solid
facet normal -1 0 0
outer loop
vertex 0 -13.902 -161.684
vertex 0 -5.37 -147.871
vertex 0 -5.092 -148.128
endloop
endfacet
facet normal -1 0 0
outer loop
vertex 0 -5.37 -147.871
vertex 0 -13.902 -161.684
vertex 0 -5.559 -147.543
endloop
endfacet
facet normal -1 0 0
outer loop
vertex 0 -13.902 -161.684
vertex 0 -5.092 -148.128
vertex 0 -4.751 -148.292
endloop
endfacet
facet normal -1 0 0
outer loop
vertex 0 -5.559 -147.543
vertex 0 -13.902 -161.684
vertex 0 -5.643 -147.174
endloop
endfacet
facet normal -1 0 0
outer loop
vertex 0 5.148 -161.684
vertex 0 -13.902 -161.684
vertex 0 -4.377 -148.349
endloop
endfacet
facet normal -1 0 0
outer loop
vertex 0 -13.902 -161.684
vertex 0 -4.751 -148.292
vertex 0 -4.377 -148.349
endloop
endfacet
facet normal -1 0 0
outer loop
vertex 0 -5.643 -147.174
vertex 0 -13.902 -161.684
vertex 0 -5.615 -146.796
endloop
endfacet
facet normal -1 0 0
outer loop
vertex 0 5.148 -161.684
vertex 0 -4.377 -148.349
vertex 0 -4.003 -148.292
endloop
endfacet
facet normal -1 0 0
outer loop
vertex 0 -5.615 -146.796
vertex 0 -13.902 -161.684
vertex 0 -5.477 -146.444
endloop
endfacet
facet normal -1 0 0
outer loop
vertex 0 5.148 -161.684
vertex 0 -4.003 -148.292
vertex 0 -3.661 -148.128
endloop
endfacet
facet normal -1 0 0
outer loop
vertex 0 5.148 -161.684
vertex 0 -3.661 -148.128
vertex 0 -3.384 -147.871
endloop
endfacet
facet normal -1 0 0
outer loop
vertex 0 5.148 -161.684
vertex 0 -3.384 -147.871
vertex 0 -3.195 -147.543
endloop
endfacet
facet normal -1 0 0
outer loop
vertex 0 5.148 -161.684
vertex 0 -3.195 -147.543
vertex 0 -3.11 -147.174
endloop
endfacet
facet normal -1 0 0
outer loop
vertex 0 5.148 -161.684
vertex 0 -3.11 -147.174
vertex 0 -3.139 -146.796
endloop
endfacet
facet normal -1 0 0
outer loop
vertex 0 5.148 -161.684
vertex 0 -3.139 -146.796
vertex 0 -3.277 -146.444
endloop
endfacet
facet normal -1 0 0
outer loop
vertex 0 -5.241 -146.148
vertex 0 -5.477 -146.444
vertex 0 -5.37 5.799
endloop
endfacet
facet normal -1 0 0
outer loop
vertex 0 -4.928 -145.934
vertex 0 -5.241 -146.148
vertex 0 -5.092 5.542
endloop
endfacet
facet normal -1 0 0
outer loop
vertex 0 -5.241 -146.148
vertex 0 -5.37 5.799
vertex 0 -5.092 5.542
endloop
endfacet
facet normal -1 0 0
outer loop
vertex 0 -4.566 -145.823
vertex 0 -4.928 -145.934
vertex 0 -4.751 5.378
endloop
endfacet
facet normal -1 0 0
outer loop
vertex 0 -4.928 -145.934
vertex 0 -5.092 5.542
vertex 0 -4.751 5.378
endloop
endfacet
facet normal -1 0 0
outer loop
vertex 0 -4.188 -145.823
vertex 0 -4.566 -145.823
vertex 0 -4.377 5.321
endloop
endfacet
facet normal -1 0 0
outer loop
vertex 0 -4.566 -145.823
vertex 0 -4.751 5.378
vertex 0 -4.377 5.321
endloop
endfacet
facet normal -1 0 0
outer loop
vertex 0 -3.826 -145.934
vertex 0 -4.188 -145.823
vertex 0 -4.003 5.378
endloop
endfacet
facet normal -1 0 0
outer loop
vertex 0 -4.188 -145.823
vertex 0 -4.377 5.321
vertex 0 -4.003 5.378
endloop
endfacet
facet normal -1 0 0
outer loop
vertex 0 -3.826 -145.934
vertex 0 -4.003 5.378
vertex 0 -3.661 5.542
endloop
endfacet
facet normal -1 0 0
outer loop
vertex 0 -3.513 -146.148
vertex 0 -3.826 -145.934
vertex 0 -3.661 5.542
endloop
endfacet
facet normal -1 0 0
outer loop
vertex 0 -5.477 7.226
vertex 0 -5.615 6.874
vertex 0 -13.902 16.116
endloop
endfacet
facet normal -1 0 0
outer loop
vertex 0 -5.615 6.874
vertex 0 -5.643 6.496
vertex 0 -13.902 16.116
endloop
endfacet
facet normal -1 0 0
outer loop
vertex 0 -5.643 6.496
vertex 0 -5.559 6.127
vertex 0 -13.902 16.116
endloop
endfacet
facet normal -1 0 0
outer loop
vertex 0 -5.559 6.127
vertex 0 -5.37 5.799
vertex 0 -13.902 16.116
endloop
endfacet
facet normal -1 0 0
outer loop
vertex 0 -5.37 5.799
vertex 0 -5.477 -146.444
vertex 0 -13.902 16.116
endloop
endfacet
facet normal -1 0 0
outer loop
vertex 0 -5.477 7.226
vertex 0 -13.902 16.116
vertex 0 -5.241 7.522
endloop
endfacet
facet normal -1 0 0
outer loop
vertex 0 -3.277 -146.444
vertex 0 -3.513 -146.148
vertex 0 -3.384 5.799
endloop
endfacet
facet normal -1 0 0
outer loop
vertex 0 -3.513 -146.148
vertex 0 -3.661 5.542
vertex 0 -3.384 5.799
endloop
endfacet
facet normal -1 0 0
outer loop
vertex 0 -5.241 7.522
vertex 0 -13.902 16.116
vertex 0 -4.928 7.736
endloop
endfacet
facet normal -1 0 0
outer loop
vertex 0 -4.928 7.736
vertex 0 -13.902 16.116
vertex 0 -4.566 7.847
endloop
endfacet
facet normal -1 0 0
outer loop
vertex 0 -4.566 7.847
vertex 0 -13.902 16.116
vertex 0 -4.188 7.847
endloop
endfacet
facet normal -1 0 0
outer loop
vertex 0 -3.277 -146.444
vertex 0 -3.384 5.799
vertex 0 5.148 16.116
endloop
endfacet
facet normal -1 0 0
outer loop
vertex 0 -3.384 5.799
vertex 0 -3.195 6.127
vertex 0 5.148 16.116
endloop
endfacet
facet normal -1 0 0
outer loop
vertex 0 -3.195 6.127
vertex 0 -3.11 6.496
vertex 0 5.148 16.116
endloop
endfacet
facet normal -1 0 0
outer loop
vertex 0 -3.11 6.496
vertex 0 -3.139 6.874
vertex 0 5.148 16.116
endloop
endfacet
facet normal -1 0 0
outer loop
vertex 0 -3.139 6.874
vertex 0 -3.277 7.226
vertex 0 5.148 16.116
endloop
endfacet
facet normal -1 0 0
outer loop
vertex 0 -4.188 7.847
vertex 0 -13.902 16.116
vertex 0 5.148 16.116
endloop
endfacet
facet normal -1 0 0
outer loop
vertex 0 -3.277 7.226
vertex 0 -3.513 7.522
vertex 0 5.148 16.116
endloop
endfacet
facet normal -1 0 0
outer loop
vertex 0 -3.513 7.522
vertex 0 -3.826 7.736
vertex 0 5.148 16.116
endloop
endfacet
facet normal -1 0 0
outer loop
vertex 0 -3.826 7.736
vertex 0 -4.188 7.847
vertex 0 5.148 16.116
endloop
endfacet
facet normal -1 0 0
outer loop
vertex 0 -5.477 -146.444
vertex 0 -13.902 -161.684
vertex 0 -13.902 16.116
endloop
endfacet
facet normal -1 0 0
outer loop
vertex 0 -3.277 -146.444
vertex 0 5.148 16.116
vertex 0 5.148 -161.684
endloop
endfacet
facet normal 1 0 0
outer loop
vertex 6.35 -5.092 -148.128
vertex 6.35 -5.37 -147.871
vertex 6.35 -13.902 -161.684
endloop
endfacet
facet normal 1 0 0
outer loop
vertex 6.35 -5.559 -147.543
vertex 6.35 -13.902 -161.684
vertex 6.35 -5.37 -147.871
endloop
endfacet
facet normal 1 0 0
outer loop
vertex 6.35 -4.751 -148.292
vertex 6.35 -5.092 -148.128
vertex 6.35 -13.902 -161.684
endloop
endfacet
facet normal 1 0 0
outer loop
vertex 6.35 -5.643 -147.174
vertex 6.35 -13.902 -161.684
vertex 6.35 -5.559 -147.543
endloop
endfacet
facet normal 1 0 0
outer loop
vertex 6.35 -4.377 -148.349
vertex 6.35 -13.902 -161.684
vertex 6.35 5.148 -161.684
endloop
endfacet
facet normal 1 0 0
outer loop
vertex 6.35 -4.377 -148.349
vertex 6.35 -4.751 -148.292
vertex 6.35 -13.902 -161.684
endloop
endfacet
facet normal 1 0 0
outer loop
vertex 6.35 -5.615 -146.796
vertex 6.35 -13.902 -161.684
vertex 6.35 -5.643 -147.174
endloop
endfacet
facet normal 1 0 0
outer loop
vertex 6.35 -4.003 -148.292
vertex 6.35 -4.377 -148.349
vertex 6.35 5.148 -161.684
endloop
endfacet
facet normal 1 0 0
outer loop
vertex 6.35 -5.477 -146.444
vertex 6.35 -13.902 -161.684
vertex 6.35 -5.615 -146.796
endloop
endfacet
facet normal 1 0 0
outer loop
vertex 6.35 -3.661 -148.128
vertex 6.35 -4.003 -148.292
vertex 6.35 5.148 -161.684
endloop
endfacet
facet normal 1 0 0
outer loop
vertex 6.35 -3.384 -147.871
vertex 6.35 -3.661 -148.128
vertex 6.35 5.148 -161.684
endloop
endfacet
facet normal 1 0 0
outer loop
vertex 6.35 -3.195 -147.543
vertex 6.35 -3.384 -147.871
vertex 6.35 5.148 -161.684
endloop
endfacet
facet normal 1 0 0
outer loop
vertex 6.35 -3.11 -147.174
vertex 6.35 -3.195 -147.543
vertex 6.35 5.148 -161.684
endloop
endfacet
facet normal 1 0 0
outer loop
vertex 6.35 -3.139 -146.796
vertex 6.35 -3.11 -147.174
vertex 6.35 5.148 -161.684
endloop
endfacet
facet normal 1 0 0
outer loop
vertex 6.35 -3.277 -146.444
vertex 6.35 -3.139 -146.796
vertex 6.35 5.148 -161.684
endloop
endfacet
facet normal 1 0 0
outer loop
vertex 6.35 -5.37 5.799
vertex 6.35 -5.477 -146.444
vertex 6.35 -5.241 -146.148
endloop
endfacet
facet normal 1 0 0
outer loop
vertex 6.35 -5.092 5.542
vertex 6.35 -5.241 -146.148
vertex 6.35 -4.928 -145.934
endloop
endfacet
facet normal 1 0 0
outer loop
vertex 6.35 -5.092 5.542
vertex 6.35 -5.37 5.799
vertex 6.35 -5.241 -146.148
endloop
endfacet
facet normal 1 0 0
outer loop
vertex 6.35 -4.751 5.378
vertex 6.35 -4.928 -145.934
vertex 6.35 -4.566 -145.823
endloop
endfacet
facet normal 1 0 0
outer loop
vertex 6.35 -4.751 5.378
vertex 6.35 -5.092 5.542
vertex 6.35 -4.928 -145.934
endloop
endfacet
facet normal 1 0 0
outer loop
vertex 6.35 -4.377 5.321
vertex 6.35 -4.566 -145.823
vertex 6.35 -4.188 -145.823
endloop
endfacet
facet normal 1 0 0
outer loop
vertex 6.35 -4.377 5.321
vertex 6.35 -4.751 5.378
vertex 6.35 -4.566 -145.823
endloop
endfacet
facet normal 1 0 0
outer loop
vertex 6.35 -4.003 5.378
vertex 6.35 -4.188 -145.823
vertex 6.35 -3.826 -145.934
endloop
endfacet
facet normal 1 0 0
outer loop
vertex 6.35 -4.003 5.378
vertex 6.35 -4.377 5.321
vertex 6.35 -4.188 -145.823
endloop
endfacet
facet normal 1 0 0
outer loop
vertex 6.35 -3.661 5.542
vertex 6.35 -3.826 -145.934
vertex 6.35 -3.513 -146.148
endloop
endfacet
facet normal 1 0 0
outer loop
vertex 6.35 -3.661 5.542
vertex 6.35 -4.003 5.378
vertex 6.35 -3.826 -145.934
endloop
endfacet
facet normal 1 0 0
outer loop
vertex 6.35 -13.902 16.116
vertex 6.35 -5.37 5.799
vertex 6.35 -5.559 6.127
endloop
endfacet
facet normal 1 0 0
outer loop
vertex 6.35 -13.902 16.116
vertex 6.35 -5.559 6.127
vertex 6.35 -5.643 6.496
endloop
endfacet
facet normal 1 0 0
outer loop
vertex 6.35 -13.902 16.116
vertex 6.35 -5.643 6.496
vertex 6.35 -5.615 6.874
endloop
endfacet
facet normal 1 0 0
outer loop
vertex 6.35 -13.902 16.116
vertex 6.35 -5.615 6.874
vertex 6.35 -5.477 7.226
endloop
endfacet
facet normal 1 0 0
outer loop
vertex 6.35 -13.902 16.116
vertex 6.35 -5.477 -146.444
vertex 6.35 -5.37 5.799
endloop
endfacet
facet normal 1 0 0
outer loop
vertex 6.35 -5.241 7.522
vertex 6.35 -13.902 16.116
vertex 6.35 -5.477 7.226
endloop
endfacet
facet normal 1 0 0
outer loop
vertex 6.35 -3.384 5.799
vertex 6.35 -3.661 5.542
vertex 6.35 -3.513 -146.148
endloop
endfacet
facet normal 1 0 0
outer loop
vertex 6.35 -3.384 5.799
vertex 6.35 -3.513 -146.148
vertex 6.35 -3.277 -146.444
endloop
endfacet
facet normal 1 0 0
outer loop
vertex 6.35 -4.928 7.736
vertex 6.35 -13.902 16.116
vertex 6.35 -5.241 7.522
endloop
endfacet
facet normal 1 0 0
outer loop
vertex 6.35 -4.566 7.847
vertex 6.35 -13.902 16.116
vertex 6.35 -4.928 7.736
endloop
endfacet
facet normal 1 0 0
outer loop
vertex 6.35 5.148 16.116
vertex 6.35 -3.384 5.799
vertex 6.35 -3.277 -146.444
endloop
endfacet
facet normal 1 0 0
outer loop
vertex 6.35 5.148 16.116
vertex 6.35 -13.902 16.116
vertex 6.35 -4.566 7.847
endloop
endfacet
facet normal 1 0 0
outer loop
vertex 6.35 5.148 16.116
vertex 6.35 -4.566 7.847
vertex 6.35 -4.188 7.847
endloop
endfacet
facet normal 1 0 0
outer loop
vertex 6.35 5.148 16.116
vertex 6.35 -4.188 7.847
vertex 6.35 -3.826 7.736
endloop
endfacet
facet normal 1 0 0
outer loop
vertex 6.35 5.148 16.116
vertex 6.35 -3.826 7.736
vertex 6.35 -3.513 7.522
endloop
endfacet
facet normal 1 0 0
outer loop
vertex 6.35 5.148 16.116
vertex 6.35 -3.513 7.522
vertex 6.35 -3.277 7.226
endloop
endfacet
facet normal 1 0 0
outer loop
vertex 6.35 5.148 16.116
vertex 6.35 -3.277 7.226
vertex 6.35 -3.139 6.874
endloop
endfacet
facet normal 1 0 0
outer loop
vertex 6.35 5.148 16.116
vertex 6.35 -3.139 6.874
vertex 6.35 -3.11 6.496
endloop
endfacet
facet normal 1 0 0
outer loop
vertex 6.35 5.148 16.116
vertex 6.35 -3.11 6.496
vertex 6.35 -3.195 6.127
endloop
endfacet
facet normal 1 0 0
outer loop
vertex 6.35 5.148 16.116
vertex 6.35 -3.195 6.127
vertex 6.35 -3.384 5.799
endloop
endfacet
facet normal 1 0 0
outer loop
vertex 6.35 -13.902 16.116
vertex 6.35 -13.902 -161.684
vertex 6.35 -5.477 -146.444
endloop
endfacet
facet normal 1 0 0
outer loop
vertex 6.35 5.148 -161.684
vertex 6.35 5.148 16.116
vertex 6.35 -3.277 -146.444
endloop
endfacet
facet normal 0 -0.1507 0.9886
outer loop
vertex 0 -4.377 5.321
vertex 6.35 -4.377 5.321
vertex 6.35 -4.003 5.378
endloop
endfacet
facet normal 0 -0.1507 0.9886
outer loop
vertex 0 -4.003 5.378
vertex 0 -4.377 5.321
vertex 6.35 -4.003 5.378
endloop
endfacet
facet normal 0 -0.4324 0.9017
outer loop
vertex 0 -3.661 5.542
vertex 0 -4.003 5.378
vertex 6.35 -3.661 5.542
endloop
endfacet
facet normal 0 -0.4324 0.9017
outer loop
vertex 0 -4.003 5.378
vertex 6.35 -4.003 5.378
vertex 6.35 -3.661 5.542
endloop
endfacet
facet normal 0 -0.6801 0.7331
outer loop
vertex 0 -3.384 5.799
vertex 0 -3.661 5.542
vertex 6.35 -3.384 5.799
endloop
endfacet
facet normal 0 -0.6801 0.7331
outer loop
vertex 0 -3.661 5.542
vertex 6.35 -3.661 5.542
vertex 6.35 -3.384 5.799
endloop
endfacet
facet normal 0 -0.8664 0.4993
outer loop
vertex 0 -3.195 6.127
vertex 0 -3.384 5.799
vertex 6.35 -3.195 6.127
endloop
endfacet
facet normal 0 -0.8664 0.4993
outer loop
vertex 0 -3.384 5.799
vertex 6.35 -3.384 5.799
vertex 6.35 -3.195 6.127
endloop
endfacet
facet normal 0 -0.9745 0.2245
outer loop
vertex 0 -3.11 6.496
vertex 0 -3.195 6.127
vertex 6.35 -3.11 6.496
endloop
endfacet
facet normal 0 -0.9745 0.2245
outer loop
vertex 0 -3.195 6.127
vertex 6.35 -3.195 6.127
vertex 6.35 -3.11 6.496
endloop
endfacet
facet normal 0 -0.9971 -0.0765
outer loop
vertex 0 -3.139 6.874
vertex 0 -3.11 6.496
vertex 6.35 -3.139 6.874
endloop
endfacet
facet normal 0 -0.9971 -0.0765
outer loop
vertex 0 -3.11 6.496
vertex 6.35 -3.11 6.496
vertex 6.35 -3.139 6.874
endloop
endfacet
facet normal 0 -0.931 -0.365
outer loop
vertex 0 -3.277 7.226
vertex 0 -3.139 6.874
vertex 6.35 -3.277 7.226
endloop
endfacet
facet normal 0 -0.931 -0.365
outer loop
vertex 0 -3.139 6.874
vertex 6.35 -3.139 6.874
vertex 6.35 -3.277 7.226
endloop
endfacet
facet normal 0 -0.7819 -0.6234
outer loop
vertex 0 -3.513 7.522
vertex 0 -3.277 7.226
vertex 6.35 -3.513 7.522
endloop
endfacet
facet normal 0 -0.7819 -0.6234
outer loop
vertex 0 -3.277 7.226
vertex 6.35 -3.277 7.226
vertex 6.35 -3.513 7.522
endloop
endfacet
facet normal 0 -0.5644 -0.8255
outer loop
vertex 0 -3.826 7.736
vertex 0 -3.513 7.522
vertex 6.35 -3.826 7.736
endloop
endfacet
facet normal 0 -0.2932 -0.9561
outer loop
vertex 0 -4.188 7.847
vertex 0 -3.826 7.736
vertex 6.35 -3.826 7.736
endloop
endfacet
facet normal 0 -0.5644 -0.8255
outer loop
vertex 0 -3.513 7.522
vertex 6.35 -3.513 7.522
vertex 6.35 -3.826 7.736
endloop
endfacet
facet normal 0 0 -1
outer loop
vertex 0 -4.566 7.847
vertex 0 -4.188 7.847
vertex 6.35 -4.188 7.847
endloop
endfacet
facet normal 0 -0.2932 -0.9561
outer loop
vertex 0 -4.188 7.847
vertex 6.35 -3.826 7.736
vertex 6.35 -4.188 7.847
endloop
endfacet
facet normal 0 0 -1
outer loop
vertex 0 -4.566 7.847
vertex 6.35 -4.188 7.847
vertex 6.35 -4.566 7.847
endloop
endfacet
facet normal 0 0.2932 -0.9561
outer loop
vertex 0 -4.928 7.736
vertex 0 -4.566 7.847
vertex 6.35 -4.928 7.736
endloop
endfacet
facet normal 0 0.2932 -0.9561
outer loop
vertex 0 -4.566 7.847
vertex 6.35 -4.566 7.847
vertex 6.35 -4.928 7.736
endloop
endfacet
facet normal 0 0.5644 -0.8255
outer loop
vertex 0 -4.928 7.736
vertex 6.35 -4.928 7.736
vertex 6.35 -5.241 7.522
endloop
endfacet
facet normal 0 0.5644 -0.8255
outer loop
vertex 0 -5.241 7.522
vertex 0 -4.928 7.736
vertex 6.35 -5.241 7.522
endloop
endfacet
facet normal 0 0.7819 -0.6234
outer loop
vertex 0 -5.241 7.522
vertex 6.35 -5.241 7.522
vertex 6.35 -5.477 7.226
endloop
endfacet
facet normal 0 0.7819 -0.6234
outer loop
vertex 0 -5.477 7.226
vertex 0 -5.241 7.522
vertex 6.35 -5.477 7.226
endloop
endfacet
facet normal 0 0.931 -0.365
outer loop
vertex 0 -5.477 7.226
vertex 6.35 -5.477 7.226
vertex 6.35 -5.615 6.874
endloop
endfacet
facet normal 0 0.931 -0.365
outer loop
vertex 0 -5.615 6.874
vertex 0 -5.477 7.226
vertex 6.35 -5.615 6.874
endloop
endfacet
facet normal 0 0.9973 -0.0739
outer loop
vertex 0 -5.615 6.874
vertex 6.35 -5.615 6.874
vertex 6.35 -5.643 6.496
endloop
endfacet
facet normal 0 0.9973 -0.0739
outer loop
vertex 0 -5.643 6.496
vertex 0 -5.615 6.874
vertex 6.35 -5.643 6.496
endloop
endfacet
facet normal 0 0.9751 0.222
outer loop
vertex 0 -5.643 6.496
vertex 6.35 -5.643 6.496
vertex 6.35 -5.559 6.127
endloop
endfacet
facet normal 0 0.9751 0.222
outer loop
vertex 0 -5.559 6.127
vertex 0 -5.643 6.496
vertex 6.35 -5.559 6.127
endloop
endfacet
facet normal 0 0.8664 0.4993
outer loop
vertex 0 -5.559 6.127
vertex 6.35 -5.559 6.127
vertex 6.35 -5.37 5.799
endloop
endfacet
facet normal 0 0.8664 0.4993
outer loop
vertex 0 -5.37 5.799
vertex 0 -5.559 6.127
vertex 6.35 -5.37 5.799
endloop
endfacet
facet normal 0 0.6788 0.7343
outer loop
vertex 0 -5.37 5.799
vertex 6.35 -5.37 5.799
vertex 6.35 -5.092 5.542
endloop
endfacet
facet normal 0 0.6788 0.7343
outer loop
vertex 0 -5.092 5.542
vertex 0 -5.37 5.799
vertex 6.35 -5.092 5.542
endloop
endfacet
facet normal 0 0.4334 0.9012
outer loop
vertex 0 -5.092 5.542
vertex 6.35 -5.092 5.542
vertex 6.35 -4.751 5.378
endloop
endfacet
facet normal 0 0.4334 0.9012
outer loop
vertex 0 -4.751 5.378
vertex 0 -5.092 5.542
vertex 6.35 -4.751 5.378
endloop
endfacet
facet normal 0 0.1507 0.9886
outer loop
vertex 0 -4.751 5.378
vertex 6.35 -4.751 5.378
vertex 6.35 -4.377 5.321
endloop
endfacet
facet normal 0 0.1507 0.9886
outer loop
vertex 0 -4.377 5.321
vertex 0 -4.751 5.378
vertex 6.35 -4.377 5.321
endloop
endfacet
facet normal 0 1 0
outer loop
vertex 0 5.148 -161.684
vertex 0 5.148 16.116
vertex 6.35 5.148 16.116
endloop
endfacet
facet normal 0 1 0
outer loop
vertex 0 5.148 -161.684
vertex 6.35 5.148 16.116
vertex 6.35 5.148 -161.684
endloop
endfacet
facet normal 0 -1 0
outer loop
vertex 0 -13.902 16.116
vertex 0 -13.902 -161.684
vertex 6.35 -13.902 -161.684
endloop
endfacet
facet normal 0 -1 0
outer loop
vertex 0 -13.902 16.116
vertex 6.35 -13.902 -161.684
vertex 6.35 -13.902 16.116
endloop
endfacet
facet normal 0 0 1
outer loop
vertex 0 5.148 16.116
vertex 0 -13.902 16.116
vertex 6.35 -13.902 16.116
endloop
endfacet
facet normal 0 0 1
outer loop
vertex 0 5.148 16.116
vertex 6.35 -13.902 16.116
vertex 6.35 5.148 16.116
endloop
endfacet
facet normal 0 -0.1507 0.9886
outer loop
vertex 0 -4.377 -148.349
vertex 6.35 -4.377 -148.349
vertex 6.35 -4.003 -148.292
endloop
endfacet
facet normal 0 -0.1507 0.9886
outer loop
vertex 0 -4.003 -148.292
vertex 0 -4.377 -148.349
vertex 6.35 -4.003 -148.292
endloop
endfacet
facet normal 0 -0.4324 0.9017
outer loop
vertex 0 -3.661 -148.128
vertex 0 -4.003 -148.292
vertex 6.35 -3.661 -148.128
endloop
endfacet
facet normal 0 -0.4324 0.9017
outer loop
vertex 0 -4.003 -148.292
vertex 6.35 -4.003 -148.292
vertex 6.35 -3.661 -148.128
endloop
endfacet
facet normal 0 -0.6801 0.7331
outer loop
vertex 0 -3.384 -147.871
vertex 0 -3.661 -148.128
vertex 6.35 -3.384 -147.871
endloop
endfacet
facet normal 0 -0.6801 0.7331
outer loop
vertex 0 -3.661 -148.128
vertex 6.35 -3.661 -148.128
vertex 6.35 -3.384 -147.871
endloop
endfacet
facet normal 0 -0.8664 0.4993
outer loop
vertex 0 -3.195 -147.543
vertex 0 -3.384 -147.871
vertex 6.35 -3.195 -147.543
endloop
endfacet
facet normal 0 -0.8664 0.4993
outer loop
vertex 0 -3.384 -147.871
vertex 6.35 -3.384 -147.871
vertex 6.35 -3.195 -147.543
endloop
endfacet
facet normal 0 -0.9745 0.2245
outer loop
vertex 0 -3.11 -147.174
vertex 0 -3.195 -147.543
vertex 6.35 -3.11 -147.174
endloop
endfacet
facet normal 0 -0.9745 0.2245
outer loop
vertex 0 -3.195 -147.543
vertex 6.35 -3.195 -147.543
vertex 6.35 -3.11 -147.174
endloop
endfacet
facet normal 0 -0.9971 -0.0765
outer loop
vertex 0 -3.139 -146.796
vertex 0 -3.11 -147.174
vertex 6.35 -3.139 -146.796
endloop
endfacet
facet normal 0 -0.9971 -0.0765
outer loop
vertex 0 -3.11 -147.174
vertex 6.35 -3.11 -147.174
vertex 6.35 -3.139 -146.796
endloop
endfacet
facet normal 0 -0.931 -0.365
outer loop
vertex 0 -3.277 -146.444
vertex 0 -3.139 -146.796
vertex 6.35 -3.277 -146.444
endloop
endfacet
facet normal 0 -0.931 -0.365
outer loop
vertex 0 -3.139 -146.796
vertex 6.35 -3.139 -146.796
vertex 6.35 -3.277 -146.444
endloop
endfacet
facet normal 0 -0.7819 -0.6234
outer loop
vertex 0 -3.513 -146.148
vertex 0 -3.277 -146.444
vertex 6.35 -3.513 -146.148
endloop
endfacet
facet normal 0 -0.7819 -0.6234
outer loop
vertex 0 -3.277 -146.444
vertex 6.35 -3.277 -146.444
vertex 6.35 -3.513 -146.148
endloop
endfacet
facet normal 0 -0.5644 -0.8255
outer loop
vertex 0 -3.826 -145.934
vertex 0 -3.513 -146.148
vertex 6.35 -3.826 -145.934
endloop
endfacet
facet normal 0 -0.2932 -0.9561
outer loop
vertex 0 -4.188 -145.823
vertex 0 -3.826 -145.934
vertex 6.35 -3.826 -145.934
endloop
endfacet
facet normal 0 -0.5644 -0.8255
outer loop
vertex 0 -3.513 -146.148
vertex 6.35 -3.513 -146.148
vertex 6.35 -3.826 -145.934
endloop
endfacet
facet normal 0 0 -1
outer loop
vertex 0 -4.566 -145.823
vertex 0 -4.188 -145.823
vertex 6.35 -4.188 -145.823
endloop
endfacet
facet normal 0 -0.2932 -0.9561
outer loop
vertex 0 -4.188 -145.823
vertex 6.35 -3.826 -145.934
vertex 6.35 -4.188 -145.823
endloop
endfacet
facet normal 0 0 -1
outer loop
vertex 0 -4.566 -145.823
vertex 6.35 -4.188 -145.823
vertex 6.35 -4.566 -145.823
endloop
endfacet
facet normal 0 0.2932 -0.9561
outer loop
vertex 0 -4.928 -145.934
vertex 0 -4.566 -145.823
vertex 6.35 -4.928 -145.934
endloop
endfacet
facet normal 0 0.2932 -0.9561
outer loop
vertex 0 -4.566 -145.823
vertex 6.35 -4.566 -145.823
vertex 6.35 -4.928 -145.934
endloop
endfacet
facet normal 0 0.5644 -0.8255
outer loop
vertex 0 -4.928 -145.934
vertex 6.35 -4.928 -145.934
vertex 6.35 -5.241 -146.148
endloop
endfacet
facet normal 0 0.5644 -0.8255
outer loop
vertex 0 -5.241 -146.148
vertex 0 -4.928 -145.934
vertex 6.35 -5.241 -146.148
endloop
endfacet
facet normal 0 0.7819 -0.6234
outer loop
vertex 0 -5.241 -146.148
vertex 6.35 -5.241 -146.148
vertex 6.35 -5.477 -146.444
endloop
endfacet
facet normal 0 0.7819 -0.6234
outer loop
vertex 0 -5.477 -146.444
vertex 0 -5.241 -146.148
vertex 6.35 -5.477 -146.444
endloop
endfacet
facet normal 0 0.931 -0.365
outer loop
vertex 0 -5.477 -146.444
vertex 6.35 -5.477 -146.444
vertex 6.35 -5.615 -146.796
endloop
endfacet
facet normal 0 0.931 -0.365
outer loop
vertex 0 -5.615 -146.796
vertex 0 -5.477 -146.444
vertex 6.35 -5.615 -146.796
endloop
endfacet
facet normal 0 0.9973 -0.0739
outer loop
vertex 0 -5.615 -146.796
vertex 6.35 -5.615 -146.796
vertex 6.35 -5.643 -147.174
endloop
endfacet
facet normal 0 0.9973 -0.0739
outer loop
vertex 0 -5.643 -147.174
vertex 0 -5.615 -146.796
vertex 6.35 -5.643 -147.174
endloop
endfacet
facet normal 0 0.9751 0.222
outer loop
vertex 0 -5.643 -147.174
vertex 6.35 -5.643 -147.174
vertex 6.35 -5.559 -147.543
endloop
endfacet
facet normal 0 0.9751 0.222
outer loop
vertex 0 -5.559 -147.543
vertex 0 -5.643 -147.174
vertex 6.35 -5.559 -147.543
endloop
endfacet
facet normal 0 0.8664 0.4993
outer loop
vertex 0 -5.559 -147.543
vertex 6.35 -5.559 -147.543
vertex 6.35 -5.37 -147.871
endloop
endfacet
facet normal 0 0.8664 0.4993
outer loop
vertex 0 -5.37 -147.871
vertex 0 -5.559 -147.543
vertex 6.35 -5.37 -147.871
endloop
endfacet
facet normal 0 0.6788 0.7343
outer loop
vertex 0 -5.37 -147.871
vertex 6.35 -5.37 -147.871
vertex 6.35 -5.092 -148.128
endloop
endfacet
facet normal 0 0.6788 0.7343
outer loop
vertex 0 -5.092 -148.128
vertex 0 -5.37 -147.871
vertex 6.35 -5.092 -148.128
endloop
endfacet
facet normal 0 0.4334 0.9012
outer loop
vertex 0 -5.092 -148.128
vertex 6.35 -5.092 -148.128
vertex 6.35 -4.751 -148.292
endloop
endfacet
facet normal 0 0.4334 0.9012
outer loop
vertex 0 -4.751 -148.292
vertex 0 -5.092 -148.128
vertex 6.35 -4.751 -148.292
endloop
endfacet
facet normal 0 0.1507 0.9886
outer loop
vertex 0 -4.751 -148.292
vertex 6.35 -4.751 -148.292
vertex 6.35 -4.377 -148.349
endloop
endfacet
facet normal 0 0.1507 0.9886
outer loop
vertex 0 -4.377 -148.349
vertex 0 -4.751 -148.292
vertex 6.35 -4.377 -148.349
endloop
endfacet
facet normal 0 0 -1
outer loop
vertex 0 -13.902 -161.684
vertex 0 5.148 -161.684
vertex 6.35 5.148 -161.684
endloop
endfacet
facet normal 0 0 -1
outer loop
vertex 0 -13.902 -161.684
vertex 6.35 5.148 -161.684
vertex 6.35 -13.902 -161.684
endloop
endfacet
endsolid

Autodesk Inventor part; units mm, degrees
ref_plane "YZ Plane" through (0, 0, 0) normal (1, 0, 0) x (0, 1, 0)
ref_plane "XZ Plane" through (0, 0, 0) normal (0, 1, 0) x (-1, 0, 0)
ref_plane "XY Plane" through (0, 0, 0) normal (0, 0, 1) x (1, 0, 0)
sketch "Sketch1" plane through (0, 0, 0) normal (1, 0, 0) x (0, 1, 0)
  line L0 (5.1481, 16.1163) -> (5.1481, -161.6837)
  line L1 (5.1481, -161.6837) -> (-13.9019, -161.6837)
  line L2 (-13.9019, -161.6837) -> (-13.9019, 16.1163)
  line L3 (-13.9019, 16.1163) -> (5.1481, 16.1163)
  point P0 (0, 0)
  dimension "d0" = 177.8
  dimension "d1" = 19.05
  dimension "d2" = 177.8
extrude "Extrusion1" add sketch "Sketch1" along normal blind 6.35
sketch "Sketch2" plane through (6.35, 0, 0) normal (1, 0, 0) x (0, 0, -1)
  line L0 (-16.1163, 5.1481) -> (-16.1163, -13.9019) projected
  line L1 (-16.1163, 5.1481) -> (-16.1163, -4.3769)
  line L2 (-16.1163, -4.3769) -> (-6.5913, -4.3769)
  circle A0 centre (-6.5913, -4.3769) radius 1.27
  line L3 (-5.3213, -4.3769) -> (147.0787, -4.3769)
  circle A1 centre (147.0787, -4.3769) radius 1.27
  point P0 (0, 0)
  dimension "d8" = 2.54
  dimension "d5" = 9.525
  dimension "d6" = 9.525
  dimension "d9" = 152.4
  dimension "d10" = 2.54
extrude "Extrusion2" cut sketch "Sketch2" against normal blind 6.35
